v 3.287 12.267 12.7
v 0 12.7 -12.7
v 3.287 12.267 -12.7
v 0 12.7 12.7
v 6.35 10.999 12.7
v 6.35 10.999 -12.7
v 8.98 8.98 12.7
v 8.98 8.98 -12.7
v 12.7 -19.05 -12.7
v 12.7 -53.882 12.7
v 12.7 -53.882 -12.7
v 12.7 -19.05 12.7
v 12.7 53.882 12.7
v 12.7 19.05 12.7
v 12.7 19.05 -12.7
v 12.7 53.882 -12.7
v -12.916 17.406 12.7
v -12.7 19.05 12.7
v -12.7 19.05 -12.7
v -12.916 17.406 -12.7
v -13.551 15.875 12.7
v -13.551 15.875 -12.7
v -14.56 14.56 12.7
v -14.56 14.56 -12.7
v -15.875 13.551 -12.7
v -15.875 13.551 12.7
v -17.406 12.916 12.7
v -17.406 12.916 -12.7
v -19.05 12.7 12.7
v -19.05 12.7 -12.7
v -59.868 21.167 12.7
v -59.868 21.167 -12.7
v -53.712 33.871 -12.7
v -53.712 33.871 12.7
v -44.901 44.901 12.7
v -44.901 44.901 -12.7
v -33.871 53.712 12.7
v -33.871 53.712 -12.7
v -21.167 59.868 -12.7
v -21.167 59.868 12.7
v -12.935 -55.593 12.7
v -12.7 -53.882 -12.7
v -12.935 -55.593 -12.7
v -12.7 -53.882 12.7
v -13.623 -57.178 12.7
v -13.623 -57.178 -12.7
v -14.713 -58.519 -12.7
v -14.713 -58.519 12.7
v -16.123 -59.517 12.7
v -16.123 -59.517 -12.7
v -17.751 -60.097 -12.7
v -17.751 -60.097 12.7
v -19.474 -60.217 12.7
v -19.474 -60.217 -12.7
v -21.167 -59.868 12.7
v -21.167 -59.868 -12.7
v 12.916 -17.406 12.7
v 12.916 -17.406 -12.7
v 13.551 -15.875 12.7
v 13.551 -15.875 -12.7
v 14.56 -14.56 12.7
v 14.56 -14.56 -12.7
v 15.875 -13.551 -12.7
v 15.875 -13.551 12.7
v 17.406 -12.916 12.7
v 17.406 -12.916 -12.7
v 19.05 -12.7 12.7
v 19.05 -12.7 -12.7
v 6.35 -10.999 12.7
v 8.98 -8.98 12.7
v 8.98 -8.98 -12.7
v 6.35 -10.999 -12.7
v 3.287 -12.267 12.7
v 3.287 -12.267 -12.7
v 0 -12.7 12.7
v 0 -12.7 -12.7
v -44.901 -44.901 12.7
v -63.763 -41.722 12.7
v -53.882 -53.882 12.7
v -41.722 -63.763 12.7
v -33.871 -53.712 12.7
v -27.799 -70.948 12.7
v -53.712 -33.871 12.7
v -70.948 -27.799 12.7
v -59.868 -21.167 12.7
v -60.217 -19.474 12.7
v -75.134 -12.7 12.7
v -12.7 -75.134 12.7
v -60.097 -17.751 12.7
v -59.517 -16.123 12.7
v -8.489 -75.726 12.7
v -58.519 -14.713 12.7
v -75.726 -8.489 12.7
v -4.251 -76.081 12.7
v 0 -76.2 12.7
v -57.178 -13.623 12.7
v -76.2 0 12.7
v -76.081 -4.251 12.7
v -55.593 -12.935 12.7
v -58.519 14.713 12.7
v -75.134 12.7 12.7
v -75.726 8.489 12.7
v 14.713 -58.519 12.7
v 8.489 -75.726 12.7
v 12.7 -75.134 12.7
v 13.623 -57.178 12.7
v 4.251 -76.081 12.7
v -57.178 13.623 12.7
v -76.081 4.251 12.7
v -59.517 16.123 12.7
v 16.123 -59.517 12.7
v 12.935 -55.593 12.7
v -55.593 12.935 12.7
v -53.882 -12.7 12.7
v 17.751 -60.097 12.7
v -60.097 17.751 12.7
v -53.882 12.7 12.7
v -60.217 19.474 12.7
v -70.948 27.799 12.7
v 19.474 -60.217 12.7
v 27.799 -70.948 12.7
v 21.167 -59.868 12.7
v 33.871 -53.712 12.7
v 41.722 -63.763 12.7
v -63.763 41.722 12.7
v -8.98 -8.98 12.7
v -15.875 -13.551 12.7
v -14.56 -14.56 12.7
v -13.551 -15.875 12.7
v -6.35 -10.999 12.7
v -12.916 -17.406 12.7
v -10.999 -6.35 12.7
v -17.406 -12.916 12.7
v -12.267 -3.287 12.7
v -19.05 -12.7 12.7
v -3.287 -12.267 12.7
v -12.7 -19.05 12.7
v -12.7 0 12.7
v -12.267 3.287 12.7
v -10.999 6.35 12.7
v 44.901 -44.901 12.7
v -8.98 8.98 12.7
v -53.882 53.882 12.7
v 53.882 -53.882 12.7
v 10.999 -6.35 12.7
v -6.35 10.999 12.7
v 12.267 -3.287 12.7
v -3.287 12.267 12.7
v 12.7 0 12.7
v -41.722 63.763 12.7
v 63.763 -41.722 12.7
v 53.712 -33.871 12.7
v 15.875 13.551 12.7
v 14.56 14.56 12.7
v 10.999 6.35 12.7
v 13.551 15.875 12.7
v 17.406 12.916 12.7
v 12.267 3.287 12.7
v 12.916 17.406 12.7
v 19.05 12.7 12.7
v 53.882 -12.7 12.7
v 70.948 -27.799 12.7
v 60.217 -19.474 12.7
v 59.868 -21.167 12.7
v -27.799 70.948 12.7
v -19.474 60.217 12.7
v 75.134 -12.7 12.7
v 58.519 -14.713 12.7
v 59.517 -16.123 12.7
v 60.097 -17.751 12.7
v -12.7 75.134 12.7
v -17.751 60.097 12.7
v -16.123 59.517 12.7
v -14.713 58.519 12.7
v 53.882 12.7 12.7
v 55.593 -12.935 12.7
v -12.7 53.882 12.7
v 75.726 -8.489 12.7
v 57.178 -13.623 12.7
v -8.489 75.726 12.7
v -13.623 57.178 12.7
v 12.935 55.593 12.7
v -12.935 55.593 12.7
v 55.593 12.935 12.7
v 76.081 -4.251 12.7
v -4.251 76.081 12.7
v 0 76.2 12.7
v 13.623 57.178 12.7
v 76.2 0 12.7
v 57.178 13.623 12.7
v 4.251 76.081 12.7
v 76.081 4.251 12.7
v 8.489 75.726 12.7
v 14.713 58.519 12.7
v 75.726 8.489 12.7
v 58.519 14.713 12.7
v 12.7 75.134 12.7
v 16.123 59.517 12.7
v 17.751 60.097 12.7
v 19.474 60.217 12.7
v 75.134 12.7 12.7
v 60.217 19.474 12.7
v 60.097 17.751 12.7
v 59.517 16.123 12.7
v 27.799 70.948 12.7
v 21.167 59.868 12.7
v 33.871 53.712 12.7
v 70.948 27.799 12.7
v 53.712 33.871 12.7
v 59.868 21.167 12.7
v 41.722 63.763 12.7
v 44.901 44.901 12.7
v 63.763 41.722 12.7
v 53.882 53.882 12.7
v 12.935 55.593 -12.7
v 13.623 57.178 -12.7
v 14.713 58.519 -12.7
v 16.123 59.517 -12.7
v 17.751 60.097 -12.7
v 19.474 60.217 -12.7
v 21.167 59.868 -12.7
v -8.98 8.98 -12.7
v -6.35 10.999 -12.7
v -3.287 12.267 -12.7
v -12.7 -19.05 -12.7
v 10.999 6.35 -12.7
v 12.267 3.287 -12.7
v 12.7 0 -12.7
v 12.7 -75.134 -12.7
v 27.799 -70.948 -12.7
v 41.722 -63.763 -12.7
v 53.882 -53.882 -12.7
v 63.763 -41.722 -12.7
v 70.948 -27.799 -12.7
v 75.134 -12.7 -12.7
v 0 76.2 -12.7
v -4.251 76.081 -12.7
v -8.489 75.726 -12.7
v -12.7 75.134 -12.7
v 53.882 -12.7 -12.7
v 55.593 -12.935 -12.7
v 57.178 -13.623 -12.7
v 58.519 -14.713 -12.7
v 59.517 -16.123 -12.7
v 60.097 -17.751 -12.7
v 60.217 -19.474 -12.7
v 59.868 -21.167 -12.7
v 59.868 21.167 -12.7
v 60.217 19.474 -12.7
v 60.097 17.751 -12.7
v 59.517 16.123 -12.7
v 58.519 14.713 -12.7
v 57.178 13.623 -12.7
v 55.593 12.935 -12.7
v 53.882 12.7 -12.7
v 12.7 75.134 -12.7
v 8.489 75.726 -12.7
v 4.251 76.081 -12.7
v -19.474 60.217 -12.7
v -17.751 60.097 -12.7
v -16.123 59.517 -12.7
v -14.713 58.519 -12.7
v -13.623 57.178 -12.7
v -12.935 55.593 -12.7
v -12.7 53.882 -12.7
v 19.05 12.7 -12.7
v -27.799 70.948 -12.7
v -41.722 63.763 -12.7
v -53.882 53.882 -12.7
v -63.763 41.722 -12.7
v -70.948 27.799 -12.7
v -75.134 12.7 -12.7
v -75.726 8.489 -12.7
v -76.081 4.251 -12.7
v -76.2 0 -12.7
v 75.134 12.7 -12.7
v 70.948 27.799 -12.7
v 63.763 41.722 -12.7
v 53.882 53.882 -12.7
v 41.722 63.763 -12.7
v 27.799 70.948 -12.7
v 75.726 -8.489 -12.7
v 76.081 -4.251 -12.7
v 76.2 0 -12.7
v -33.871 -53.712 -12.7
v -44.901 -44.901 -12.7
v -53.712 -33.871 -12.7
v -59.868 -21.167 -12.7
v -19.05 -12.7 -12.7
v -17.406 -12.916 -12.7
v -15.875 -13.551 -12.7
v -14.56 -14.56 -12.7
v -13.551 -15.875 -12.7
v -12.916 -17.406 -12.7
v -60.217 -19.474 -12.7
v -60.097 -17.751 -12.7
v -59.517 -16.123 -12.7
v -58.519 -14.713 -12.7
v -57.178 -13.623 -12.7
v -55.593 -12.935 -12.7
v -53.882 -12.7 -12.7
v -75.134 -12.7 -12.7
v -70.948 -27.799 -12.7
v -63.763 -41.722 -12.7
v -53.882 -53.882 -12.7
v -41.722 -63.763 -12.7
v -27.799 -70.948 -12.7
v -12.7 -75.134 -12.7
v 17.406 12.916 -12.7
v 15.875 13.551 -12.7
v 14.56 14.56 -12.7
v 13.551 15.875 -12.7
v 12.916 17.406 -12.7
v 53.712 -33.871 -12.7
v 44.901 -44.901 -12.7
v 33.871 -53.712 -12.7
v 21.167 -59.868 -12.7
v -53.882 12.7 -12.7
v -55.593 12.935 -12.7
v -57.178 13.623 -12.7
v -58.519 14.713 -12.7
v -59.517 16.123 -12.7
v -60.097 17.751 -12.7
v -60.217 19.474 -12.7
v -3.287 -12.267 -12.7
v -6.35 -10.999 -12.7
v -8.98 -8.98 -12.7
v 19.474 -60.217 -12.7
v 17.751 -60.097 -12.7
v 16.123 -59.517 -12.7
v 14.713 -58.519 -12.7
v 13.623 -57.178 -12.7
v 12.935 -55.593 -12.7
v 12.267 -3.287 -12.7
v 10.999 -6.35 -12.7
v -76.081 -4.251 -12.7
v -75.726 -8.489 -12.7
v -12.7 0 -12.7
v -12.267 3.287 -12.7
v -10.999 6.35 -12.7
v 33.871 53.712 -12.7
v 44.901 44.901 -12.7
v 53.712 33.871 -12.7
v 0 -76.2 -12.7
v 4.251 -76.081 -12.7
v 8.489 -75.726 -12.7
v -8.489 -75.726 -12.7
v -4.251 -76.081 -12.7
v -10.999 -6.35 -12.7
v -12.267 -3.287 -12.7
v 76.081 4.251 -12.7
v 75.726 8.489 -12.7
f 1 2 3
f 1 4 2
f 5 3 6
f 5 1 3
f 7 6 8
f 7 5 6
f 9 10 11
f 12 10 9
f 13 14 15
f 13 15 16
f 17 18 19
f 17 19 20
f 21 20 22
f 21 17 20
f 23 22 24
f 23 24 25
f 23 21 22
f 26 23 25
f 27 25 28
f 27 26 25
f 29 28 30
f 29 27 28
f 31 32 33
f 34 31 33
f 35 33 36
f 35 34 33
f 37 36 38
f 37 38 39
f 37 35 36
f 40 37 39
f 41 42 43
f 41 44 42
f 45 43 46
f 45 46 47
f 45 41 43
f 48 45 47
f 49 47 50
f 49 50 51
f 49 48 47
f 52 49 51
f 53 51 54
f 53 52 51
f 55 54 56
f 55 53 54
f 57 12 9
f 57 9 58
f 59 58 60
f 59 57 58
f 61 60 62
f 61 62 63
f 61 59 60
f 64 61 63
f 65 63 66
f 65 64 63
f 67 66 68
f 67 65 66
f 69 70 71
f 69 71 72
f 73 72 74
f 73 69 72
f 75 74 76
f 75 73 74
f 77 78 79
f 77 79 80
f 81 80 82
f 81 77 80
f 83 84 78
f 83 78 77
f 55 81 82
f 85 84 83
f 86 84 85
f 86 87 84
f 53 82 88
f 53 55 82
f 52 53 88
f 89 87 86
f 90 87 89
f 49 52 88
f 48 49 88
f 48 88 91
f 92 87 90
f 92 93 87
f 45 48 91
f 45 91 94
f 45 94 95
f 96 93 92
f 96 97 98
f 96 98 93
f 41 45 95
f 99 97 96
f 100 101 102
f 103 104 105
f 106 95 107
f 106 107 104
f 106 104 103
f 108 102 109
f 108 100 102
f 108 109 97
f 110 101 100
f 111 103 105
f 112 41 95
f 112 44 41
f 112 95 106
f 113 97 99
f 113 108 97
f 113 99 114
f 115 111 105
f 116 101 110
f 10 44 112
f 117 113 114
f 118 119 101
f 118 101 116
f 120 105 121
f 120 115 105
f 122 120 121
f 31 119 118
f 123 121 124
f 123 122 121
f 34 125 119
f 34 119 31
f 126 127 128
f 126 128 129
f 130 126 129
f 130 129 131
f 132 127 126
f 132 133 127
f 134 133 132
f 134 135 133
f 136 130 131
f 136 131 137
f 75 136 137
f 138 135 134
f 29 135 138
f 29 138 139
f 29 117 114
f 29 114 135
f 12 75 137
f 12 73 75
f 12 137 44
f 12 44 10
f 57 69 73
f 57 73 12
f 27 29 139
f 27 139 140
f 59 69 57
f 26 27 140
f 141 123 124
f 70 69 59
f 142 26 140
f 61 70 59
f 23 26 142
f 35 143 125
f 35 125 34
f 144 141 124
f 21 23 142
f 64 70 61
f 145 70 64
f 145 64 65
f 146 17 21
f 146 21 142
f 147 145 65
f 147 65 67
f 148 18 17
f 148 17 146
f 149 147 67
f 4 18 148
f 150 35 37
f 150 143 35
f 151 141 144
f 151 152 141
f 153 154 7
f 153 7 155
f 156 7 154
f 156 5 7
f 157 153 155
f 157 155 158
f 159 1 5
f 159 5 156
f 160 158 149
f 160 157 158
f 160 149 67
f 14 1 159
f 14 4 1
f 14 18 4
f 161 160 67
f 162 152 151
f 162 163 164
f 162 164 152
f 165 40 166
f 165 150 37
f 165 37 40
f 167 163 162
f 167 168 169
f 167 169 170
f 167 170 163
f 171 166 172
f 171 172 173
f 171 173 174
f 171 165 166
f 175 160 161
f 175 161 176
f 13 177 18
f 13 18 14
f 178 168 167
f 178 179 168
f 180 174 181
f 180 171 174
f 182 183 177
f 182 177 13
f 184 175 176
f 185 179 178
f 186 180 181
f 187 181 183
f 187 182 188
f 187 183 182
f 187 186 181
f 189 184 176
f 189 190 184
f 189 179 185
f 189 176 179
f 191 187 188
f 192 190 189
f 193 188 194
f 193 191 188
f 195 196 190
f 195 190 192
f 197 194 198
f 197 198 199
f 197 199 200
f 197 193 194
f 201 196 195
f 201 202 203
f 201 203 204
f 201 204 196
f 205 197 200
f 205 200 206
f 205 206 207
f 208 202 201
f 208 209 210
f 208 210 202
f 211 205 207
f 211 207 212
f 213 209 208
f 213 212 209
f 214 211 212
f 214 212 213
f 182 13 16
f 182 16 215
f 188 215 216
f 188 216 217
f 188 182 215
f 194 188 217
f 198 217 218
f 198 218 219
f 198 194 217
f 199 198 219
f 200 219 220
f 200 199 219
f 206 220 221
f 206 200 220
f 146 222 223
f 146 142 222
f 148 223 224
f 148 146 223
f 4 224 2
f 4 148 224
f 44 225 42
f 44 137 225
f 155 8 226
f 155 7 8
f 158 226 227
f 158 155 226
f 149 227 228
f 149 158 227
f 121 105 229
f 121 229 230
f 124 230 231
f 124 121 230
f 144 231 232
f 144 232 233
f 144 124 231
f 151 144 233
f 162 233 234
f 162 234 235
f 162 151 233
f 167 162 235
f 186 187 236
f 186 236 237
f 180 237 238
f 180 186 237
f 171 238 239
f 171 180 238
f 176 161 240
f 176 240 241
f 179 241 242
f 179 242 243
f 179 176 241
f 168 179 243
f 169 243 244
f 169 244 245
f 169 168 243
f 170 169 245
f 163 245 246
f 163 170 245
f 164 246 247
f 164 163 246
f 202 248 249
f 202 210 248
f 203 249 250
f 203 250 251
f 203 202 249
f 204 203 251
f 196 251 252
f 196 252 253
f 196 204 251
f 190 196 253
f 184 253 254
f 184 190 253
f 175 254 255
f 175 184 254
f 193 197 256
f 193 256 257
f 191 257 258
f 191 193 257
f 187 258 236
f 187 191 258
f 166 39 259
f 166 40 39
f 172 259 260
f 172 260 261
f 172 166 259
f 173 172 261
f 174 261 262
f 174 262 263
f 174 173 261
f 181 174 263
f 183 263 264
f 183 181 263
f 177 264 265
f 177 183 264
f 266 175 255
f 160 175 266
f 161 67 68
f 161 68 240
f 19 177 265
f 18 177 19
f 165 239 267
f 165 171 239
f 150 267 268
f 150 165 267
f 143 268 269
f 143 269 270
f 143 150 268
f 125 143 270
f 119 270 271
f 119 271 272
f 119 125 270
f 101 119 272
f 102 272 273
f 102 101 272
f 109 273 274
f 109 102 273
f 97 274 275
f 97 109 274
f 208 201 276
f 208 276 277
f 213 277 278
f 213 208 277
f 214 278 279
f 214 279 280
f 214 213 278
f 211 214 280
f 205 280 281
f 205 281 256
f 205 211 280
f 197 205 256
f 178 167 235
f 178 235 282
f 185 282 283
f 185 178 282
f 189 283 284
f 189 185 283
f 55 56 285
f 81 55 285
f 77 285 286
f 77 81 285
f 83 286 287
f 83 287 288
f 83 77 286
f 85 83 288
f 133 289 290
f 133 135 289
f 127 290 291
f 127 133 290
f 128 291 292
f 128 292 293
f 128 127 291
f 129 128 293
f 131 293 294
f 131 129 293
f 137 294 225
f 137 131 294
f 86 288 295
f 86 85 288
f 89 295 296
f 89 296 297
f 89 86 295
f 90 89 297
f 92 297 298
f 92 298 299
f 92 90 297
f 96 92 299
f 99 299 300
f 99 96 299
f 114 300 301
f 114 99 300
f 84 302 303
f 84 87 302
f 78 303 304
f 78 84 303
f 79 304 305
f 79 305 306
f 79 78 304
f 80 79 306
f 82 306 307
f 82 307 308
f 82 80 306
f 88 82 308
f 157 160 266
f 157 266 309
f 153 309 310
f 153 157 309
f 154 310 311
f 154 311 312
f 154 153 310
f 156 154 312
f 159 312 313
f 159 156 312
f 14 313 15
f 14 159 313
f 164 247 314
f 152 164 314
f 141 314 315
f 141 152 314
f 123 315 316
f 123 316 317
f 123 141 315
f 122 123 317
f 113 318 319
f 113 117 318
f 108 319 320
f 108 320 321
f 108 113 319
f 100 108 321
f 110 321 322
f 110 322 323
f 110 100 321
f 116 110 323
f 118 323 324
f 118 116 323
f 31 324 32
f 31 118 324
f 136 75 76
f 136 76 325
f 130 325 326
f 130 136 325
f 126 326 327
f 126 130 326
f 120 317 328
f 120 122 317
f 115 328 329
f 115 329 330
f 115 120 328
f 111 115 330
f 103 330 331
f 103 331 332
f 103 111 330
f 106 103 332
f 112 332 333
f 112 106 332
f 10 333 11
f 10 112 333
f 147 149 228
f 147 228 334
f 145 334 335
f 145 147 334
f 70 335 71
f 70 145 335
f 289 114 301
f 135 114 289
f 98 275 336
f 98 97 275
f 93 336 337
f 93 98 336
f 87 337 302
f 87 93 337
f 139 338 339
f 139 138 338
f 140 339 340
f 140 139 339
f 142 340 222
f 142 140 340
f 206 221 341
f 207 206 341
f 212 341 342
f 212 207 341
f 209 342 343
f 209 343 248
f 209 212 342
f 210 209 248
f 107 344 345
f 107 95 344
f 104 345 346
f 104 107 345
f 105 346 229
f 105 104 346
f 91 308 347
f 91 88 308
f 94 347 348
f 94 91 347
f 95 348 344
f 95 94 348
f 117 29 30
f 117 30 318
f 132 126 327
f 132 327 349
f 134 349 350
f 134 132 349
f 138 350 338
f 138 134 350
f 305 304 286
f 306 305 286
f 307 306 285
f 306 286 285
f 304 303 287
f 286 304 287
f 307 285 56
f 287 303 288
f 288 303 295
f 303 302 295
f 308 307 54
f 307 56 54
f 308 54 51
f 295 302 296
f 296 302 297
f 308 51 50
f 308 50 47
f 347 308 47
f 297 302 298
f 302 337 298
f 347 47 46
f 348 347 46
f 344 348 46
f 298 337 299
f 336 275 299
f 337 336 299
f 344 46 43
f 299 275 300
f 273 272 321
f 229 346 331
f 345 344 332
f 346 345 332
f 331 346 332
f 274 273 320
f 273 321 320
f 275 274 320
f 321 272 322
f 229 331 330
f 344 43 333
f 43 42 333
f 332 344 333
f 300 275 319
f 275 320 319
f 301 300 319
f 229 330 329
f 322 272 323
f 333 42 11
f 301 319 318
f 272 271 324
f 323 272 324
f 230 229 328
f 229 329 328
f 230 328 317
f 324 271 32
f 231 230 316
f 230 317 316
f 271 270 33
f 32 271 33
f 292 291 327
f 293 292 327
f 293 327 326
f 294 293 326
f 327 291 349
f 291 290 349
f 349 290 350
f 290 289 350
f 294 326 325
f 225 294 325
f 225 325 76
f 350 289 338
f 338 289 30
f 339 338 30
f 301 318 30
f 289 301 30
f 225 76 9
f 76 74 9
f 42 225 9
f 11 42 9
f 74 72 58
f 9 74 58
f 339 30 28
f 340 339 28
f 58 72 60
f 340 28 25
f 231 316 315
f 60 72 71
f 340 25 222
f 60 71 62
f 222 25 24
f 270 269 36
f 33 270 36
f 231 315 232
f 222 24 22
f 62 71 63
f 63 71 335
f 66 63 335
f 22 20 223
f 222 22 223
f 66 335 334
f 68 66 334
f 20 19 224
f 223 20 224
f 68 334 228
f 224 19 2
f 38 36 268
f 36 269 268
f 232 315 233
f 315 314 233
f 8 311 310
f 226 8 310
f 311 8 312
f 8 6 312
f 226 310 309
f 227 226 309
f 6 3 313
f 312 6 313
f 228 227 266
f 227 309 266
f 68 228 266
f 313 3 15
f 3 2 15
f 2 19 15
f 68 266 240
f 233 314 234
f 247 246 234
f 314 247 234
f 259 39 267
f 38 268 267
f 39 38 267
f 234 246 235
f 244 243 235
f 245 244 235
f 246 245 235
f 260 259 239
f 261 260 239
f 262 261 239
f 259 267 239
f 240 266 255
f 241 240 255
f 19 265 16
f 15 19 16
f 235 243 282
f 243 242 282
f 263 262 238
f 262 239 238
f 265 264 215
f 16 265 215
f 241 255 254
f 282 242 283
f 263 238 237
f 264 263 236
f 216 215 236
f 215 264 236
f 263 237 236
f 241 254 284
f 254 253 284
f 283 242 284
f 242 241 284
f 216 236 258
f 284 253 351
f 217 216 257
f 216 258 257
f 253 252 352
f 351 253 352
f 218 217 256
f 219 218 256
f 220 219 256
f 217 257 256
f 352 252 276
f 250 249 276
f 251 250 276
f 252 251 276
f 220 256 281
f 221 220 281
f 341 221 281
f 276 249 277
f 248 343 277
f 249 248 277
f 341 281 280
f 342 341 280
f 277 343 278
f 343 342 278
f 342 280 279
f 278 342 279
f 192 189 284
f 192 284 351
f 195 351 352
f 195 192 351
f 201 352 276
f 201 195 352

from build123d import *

# Parameters (mm, degrees)
F1_DEPTH = 12.7


with BuildPart() as f1:
    # F0 (on Top) → F1 (new body, symmetric)
    with BuildSketch(Plane.XY):
        with BuildLine():
            Line((12.7, 0), (76.2, 0))
            ThreePointArc((76.2, 0), (75.933086, 6.372321), (75.134213, 12.7))
            ThreePointArc((75.134213, 12.7), (53.881537, 53.881537), (12.7, 75.134213))
            ThreePointArc((12.7, 75.134213), (6.372321, 75.933086), (0, 76.2))
            Line((0, 76.2), (0, 12.7))
            ThreePointArc((0, 12.7), (4.86008, 11.73327), (8.980256, 8.980256))
            ThreePointArc((8.980256, 8.980256), (11.73327, 4.86008), (12.7, 0))
        make_face()
        with BuildLine():
            ThreePointArc((19.05, 12.7), (14.559872, 14.559872), (12.7, 19.05))
            Line((12.7, 19.05), (12.7, 53.881537))
            ThreePointArc((12.7, 53.881537), (15.383826, 59.06629), (21.166667, 59.868374))
            ThreePointArc((21.166667, 59.868374), (44.901281, 44.901281), (59.868374, 21.166667))
            ThreePointArc((59.868374, 21.166667), (59.06629, 15.383826), (53.881537, 12.7))
            Line((53.881537, 12.7), (19.05, 12.7))
        make_face(mode=Mode.SUBTRACT)
        with BuildLine():
            ThreePointArc((75.134213, -12.7), (75.933086, -6.372321), (76.2, 0))
            Line((76.2, 0), (12.7, 0))
            ThreePointArc((12.7, 0), (11.73327, -4.86008), (8.980256, -8.980256))
            ThreePointArc((8.980256, -8.980256), (4.86008, -11.73327), (0, -12.7))
            Line((0, -12.7), (0, -76.2))
            ThreePointArc((0, -76.2), (6.372321, -75.933086), (12.7, -75.134213))
            ThreePointArc((12.7, -75.134213), (53.881537, -53.881537), (75.134213, -12.7))
        make_face()
        with BuildLine():
            ThreePointArc((12.7, -19.05), (14.559872, -14.559872), (19.05, -12.7))
            Line((19.05, -12.7), (53.881537, -12.7))
            ThreePointArc((53.881537, -12.7), (59.06629, -15.383826), (59.868374, -21.166667))
            ThreePointArc((59.868374, -21.166667), (44.901281, -44.901281), (21.166667, -59.868374))
            ThreePointArc((21.166667, -59.868374), (15.383826, -59.06629), (12.7, -53.881537))
            Line((12.7, -53.881537), (12.7, -19.05))
        make_face(mode=Mode.SUBTRACT)
        with BuildLine():
            Line((0, 12.7), (0, 76.2))
            ThreePointArc((0, 76.2), (-6.372321, 75.933086), (-12.7, 75.134213))
            ThreePointArc((-12.7, 75.134213), (-53.881537, 53.881537), (-75.134213, 12.7))
            ThreePointArc((-75.134213, 12.7), (-75.933086, 6.372321), (-76.2, 0))
            Line((-76.2, 0), (-12.7, 0))
            ThreePointArc((-12.7, 0), (-11.73327, 4.86008), (-8.980256, 8.980256))
            ThreePointArc((-8.980256, 8.980256), (-4.86008, 11.73327), (0, 12.7))
        make_face()
        with BuildLine():
            Line((-12.7, 53.881537), (-12.7, 19.05))
            ThreePointArc((-12.7, 19.05), (-14.559872, 14.559872), (-19.05, 12.7))
            Line((-19.05, 12.7), (-53.881537, 12.7))
            ThreePointArc((-53.881537, 12.7), (-59.06629, 15.383826), (-59.868374, 21.166667))
            ThreePointArc((-59.868374, 21.166667), (-44.901281, 44.901281), (-21.166667, 59.868374))
            ThreePointArc((-21.166667, 59.868374), (-15.383826, 59.06629), (-12.7, 53.881537))
        make_face(mode=Mode.SUBTRACT)
        with BuildLine():
            ThreePointArc((-12.7, -75.134213), (-6.372321, -75.933086), (0, -76.2))
            Line((0, -76.2), (0, -12.7))
            ThreePointArc((0, -12.7), (-4.86008, -11.73327), (-8.980256, -8.980256))
            ThreePointArc((-8.980256, -8.980256), (-11.73327, -4.86008), (-12.7, 0))
            Line((-12.7, 0), (-76.2, 0))
            ThreePointArc((-76.2, 0), (-75.933086, -6.372321), (-75.134213, -12.7))
            ThreePointArc((-75.134213, -12.7), (-53.881537, -53.881537), (-12.7, -75.134213))
        make_face()
        with BuildLine():
            ThreePointArc((-21.166667, -59.868374), (-44.901281, -44.901281), (-59.868374, -21.166667))
            ThreePointArc((-59.868374, -21.166667), (-59.06629, -15.383826), (-53.881537, -12.7))
            Line((-53.881537, -12.7), (-19.05, -12.7))
            ThreePointArc((-19.05, -12.7), (-14.559872, -14.559872), (-12.7, -19.05))
            Line((-12.7, -19.05), (-12.7, -53.881537))
            ThreePointArc((-12.7, -53.881537), (-15.383826, -59.06629), (-21.166667, -59.868374))
        make_face(mode=Mode.SUBTRACT)
    extrude(amount=F1_DEPTH, both=True)


solid = f1.part
